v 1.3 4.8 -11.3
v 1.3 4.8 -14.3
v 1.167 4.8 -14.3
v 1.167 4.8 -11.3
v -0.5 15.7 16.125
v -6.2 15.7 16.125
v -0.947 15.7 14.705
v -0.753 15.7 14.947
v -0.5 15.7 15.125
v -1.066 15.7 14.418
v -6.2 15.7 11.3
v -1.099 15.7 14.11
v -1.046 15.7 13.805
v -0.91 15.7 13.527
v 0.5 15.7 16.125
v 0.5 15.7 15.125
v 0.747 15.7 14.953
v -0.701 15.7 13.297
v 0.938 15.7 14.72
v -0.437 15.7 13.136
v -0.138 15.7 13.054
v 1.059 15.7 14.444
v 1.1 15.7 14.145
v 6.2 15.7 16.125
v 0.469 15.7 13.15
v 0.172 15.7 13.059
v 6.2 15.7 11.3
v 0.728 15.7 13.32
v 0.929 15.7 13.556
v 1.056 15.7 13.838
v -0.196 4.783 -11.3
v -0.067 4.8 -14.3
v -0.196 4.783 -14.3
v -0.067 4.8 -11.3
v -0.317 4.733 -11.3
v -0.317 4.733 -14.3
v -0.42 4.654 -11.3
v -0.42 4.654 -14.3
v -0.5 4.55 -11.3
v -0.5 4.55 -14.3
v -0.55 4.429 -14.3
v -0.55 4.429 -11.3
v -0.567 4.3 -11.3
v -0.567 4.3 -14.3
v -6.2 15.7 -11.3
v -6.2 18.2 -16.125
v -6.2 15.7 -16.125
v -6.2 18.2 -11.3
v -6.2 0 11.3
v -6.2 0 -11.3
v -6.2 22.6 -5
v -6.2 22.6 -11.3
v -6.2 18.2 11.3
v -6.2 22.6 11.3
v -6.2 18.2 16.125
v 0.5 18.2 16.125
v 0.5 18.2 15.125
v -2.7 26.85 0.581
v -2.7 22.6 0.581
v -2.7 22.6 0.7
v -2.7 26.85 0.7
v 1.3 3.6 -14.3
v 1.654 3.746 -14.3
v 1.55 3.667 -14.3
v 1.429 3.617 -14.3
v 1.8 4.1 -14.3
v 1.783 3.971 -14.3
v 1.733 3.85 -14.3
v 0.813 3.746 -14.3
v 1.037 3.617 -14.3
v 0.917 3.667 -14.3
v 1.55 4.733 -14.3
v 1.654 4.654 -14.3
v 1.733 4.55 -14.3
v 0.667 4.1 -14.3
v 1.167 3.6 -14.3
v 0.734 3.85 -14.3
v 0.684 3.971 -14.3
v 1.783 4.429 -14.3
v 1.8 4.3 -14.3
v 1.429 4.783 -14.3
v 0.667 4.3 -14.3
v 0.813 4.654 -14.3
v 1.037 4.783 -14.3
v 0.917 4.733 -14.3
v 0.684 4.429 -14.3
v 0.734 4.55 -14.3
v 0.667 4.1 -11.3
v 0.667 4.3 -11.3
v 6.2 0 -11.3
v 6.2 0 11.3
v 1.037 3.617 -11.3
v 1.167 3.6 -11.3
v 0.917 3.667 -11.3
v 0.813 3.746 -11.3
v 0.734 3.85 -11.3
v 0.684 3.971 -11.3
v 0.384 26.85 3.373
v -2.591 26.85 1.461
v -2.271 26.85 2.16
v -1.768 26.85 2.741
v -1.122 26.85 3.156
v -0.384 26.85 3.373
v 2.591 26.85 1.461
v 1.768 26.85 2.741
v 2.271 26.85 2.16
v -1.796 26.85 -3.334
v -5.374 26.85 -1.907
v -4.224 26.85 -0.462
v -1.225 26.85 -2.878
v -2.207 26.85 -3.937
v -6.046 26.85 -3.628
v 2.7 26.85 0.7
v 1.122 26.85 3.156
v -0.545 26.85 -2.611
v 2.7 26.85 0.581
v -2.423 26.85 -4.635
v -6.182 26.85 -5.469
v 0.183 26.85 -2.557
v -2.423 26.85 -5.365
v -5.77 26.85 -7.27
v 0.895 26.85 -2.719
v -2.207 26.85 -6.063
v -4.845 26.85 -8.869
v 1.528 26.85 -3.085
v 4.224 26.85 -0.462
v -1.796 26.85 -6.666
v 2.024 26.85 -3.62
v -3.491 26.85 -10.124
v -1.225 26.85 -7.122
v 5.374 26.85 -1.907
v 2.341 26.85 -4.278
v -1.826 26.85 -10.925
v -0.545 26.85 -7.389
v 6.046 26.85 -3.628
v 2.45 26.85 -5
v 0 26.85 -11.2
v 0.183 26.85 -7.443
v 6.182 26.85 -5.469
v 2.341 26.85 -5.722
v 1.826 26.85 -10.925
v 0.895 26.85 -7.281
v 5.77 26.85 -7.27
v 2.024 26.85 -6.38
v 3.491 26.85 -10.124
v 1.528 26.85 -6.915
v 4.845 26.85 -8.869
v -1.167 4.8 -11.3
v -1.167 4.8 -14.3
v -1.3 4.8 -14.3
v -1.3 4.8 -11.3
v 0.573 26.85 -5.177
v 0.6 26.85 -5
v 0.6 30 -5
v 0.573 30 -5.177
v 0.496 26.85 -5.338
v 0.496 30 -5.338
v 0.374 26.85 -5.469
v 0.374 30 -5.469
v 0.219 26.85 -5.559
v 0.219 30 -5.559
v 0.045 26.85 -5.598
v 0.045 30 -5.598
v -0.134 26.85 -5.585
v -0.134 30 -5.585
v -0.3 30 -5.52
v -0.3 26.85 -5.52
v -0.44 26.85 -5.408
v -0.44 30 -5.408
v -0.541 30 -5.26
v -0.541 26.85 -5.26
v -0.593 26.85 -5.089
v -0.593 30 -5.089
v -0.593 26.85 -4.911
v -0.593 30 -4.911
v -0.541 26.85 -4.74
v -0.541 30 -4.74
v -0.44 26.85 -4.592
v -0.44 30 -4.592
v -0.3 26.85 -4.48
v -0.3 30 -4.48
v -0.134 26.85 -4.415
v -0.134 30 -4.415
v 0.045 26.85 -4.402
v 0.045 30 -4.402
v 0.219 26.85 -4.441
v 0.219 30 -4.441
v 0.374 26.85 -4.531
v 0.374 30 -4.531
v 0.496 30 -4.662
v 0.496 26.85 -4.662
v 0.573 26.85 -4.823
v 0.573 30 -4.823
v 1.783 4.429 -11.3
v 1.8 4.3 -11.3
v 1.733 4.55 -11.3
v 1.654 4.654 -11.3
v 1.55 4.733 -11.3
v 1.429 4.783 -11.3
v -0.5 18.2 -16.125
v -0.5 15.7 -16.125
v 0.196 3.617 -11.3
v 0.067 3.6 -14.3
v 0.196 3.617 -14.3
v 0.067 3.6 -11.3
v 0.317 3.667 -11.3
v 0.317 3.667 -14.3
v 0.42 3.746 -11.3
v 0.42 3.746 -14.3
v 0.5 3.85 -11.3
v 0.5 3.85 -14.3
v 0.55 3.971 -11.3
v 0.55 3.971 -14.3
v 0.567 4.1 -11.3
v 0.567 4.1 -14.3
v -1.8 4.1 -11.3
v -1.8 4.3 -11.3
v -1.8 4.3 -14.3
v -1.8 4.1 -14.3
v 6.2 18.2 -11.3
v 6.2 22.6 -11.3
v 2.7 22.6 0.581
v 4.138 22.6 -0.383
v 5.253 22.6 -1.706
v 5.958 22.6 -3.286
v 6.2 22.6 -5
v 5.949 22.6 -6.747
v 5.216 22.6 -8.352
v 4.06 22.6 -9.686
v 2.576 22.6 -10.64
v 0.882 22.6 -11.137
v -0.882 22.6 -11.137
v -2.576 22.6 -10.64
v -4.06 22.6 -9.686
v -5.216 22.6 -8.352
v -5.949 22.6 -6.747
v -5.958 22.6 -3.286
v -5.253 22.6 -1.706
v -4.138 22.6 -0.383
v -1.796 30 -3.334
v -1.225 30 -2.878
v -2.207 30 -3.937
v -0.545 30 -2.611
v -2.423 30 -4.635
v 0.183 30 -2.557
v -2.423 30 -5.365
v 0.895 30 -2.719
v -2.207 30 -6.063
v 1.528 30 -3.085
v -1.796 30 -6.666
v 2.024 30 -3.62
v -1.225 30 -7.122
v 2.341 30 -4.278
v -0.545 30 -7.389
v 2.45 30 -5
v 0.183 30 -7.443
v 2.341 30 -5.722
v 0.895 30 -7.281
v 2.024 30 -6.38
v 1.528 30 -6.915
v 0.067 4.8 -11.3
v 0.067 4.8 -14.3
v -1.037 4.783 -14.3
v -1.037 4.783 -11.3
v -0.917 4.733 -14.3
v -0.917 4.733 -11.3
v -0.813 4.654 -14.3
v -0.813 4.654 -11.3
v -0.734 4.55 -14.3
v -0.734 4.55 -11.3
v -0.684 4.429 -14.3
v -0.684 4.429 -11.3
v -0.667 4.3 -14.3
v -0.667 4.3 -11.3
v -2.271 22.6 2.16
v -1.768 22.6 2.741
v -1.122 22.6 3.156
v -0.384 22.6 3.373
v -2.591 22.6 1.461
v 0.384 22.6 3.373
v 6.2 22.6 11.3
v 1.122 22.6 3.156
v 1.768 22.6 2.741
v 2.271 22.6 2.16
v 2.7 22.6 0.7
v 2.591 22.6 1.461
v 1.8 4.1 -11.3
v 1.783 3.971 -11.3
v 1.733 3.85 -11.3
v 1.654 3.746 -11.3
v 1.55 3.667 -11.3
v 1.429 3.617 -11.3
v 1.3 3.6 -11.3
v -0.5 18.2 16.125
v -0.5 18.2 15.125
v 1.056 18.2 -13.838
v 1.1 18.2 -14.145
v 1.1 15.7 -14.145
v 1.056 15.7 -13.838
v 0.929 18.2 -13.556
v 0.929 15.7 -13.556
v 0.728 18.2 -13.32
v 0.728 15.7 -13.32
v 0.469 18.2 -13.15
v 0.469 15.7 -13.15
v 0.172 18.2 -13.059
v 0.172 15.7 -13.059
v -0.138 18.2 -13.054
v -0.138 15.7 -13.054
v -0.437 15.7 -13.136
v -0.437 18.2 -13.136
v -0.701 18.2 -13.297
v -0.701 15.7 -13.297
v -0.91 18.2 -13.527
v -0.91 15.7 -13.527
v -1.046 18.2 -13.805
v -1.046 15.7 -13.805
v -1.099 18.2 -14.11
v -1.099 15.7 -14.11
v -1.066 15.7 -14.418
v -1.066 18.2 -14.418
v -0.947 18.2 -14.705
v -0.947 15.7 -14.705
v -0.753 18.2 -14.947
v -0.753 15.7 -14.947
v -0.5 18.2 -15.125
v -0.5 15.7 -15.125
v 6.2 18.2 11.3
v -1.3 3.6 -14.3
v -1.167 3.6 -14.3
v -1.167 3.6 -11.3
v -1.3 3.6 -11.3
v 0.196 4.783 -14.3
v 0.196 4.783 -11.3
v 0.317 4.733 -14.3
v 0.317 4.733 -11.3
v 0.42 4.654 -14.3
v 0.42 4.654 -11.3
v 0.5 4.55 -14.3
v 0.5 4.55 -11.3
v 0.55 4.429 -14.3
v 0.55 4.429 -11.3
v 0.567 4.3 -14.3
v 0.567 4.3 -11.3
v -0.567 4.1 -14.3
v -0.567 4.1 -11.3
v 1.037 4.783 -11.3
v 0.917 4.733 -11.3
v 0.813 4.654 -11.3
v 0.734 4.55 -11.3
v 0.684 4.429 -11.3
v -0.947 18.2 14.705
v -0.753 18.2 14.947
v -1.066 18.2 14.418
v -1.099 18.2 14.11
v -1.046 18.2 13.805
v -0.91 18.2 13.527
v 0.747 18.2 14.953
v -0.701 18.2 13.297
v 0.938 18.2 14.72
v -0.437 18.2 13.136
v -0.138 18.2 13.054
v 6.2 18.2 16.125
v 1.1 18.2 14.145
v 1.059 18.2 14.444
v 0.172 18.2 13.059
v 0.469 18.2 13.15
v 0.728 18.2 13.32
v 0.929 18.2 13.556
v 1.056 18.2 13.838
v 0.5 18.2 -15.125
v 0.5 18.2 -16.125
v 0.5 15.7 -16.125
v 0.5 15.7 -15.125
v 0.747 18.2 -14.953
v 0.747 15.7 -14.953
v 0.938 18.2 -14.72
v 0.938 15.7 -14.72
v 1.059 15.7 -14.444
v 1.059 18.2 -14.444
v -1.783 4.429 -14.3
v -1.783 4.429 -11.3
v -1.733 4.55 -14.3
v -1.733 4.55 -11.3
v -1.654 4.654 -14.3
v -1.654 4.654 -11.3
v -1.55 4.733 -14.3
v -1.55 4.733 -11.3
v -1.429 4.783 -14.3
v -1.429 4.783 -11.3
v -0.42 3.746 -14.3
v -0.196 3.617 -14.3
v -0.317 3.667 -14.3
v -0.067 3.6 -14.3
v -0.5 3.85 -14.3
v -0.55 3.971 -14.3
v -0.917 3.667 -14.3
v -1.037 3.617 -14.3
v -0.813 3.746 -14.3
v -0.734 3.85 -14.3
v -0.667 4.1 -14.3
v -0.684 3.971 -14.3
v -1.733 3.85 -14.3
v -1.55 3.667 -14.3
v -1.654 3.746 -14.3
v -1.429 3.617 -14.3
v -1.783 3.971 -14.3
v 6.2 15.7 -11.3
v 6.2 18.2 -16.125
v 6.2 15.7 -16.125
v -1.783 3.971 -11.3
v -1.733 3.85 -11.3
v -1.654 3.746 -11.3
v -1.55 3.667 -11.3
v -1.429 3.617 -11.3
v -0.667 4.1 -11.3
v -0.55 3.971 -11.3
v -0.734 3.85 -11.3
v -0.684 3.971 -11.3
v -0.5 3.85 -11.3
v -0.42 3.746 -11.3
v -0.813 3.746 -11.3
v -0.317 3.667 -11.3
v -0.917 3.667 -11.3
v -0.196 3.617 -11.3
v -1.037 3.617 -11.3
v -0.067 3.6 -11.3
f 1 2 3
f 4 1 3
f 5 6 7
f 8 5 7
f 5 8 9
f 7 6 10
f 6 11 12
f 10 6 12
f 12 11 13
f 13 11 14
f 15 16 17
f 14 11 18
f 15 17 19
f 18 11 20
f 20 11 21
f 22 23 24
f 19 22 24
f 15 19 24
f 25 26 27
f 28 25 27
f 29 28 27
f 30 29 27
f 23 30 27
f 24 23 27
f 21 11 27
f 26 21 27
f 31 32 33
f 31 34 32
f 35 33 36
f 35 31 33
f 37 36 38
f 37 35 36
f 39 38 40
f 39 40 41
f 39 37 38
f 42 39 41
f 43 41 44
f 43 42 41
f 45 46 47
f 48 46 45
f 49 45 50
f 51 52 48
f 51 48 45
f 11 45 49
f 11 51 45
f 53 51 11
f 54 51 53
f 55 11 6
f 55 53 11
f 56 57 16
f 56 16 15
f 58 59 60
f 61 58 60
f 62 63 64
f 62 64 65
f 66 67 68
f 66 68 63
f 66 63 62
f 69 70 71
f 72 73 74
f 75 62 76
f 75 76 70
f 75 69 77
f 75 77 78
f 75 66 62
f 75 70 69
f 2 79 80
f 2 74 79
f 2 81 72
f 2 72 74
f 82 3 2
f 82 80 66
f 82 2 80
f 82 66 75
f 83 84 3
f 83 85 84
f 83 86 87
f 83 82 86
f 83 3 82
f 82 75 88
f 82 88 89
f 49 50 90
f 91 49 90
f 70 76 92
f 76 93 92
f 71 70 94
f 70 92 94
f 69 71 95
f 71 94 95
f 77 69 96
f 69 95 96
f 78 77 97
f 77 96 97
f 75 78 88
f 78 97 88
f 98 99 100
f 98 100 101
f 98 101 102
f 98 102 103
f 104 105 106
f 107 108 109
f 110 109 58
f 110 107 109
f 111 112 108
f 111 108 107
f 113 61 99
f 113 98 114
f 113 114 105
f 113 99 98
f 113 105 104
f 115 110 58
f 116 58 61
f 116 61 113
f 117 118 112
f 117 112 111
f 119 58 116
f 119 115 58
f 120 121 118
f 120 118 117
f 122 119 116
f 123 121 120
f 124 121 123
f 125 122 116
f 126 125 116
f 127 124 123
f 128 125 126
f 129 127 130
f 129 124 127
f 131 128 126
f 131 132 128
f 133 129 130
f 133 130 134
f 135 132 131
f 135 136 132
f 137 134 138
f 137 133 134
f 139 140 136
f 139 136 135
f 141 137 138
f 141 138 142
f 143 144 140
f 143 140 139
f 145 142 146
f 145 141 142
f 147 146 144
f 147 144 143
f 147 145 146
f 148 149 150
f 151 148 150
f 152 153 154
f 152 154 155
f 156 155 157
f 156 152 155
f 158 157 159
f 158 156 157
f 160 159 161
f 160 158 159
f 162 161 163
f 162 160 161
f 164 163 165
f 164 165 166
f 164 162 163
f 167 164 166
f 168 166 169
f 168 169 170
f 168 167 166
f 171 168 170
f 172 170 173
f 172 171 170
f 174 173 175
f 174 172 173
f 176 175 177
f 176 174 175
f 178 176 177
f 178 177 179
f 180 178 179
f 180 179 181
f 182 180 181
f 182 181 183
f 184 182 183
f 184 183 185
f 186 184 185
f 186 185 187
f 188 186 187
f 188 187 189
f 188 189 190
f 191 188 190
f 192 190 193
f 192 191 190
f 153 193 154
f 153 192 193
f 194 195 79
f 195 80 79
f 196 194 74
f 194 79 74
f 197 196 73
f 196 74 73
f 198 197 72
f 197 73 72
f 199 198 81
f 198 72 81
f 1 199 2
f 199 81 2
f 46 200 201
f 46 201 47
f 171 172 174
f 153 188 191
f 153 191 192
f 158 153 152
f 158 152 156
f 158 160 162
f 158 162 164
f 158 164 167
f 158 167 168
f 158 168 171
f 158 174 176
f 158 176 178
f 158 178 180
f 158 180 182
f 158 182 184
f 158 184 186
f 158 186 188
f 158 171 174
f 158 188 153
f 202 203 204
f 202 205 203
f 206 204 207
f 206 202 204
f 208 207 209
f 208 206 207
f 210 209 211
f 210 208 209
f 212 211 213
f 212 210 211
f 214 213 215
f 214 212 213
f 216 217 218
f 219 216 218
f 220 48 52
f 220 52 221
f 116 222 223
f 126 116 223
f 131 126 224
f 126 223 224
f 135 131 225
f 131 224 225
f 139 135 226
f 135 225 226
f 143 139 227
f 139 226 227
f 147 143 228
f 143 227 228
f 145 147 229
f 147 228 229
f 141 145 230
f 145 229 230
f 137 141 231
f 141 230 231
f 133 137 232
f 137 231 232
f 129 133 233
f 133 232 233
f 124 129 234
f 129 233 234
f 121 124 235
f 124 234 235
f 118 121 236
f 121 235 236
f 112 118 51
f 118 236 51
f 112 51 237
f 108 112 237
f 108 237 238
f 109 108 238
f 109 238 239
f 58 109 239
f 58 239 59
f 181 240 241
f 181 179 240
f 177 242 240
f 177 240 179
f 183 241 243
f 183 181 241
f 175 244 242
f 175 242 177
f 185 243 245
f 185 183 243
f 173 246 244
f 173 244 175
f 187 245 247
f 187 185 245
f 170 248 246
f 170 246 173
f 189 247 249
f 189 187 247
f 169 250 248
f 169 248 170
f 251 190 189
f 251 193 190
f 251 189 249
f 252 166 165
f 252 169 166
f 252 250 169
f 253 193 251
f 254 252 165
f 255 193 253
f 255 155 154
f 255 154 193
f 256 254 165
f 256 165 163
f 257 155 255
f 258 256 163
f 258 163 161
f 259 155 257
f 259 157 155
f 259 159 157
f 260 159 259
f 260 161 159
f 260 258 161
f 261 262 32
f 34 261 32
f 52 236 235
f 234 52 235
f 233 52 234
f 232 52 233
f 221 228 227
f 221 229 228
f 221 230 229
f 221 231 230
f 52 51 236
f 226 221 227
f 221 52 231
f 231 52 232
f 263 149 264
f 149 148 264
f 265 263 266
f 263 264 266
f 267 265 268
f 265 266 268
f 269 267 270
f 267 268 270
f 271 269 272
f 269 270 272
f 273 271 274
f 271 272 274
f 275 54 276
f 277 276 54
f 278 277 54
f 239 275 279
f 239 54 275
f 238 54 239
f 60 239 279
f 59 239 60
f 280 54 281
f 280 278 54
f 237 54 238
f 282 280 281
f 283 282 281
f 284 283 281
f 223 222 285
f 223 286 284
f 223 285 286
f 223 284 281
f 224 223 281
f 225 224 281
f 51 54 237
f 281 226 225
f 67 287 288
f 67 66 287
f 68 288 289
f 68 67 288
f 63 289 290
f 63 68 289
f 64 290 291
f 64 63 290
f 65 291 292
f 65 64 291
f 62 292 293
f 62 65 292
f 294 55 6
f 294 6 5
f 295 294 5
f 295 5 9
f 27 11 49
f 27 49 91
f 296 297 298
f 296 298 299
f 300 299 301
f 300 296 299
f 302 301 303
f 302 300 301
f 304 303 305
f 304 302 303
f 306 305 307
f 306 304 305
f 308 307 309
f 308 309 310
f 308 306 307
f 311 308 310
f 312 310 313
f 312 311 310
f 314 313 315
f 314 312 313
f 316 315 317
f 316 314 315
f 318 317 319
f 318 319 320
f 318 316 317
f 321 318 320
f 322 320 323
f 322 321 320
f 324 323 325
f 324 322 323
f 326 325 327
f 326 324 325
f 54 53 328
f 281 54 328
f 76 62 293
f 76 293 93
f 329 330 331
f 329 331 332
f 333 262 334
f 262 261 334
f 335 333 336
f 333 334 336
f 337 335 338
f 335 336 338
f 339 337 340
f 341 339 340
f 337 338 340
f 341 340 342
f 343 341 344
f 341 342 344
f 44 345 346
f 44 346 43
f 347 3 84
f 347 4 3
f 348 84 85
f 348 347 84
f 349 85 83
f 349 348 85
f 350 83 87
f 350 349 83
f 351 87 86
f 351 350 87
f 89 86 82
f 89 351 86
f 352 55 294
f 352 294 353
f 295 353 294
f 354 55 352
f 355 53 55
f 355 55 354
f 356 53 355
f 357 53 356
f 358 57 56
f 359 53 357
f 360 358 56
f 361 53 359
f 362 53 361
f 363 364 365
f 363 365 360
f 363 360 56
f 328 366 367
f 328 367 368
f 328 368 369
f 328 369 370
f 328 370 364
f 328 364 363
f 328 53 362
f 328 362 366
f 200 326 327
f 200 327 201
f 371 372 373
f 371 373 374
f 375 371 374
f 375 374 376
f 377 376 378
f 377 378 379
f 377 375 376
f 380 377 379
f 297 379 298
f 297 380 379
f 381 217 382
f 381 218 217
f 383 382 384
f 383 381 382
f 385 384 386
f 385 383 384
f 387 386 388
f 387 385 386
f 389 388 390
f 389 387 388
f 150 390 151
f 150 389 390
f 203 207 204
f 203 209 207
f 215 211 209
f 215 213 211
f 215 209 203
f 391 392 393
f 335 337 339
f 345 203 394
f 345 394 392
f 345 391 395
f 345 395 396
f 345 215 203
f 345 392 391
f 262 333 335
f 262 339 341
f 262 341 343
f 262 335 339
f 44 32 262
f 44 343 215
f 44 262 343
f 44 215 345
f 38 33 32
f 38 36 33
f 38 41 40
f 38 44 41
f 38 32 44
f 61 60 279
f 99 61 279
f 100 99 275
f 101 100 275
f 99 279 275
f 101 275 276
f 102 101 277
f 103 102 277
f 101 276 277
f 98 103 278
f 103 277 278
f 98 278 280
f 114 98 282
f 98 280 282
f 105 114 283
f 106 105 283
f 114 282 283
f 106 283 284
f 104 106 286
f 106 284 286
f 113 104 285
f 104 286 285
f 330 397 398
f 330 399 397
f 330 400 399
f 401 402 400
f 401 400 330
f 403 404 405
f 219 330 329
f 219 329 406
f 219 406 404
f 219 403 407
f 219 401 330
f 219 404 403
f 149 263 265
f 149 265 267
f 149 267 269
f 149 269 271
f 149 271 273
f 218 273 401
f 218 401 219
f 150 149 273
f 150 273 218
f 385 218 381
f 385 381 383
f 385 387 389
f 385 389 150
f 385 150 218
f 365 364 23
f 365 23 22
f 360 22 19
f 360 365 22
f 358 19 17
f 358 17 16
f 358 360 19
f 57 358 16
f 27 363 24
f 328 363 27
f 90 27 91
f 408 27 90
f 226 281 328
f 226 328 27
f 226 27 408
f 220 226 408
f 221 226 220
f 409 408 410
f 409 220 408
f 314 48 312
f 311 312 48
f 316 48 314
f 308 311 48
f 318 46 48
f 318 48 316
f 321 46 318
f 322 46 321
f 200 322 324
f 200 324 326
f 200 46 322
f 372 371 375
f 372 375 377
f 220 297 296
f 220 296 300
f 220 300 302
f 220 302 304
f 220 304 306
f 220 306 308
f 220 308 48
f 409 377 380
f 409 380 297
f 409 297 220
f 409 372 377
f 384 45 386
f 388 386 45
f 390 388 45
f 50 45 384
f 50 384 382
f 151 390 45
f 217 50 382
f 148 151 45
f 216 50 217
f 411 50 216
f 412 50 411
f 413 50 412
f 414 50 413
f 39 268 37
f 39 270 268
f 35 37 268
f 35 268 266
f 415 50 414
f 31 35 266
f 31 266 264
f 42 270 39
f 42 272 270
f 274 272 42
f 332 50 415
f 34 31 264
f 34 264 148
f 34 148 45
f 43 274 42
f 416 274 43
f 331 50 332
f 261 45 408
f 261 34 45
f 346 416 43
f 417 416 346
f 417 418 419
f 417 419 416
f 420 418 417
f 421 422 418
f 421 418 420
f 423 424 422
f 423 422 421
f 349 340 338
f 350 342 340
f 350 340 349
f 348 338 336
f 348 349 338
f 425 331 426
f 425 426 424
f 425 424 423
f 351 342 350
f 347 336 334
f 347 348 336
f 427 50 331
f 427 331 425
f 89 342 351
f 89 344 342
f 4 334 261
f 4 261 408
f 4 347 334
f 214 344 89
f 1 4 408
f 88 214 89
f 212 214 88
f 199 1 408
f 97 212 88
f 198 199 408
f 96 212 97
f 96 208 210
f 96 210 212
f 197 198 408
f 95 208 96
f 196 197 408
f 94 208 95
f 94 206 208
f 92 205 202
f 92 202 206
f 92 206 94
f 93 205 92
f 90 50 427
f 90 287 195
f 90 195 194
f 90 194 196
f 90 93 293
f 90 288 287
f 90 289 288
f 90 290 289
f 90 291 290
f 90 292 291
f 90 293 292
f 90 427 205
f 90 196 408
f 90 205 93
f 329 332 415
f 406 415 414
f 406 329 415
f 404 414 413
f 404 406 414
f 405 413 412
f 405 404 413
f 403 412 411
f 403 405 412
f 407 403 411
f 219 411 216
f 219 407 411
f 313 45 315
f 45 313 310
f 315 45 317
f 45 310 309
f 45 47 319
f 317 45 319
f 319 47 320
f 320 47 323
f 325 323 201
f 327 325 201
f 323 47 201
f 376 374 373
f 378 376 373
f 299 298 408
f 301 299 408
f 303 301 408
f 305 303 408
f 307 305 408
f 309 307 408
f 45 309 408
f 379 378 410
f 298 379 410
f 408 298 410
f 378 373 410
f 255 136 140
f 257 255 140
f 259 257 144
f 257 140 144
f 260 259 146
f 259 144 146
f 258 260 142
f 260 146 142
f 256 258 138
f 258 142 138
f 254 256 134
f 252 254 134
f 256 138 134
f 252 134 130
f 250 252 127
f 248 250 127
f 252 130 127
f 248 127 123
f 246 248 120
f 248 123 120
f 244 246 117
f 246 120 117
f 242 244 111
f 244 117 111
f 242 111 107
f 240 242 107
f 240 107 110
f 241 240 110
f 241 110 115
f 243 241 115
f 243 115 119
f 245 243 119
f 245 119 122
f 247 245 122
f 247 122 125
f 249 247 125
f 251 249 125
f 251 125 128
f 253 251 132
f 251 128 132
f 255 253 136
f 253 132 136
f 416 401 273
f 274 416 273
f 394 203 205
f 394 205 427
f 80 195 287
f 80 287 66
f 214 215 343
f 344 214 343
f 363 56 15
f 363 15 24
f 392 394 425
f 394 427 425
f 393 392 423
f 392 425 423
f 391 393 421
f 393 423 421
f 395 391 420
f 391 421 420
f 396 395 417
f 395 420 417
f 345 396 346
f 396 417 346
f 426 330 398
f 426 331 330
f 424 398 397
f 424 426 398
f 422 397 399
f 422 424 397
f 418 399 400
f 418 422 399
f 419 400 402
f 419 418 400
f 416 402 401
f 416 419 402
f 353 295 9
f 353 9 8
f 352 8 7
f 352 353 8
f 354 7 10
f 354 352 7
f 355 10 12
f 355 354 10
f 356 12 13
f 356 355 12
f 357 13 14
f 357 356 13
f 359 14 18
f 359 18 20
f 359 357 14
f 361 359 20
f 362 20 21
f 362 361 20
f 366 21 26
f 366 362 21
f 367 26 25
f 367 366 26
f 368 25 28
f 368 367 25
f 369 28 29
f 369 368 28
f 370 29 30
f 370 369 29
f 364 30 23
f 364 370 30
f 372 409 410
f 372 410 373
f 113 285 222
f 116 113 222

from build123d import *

# Parameters (mm, degrees)
IZIM1_W                     = 12.4
IZIM1_H                     = 22.6
Y_KSEKLIK_EKSTR_ZYON1_DEPTH = 22.6
Y_KSEKLIK_EKSTR_ZYON2_DEPTH = 2.5
IZIM3_W                     = 3.6
IZIM3_H                     = 3
Y_KSEKLIK_EKSTR_ZYON3_DEPTH = 1.2
IZIM4_R                     = 6.2
Y_KSEKLIK_EKSTR_ZYON4_DEPTH = 4.25
IZIM5_R                     = 2.45
IZIM5_R_2                   = 0.6
Y_KSEKLIK_EKSTR_ZYON6_DEPTH = 3.15
IZIM6_W                     = 0.1
IZIM6_H                     = 1.2
KES_EKSTR_ZYON1_DEPTH       = 3
RADYUS1_R                   = 0.5


with BuildPart() as part:
    # Çizim1 → Yükseklik-Ekstrüzyon1 (new body)
    with BuildSketch(Plane(origin=(0, 0, 0), x_dir=(1, 0, 0), z_dir=(0, 1, 0))):
        Rectangle(IZIM1_W, IZIM1_H)
    extrude(amount=Y_KSEKLIK_EKSTR_ZYON1_DEPTH)

    # Çizim2 → Yükseklik-Ekstrüzyon2 (add)
    with BuildSketch(Plane(origin=(0, 18.2, 0), x_dir=(1, 0, 0), z_dir=(0, 1, 0))):
        with BuildLine():
            Line((-6.2, 16.125), (-6.2, -16.125))
            Line((-6.2, -16.125), (-0.5, -16.125))
            Line((-0.5, -16.125), (-0.5, -15.125))
            ThreePointArc((-0.5, -15.125), (-0.574456265, -13.207120951), (1.1, -14.145204103))
            ThreePointArc((1.1, -14.145204103), (0.938083152, -14.719660368), (0.5, -15.125))
            Line((0.5, -15.125), (0.5, -16.125))
            Line((0.5, -16.125), (6.2, -16.125))
            Line((6.2, -16.125), (6.2, 16.125))
            Line((6.2, 16.125), (0.5, 16.125))
            Line((0.5, 16.125), (0.5, 15.125))
            ThreePointArc((0.5, 15.125), (0.938083152, 14.719660368), (1.1, 14.145204103))
            ThreePointArc((1.1, 14.145204103), (-0.574456265, 13.207120951), (-0.5, 15.125))
            Line((-0.5, 15.125), (-0.5, 16.125))
            Line((-0.5, 16.125), (-6.2, 16.125))
        make_face()
    extrude(amount=-Y_KSEKLIK_EKSTR_ZYON2_DEPTH)

    # Çizim3 → Yükseklik-Ekstrüzyon3 (add)
    with BuildSketch(Plane(origin=(0, 4.8, 0), x_dir=(-1, 0, 0), z_dir=(0, -1, 0))):
        with Locations((0, 12.8)):
            Rectangle(IZIM3_W, IZIM3_H)
    extrude(amount=Y_KSEKLIK_EKSTR_ZYON3_DEPTH)

    # Çizim4 → Yükseklik-Ekstrüzyon4 (add)
    with BuildSketch(Plane(origin=(0, 22.6, 0), x_dir=(1, 0, 0), z_dir=(0, 1, 0))):
        with Locations((0, 5)):
            Circle(IZIM4_R)
        with BuildLine():
            Line((-2.7, -0.581218505), (-2.7, -0.7))
            ThreePointArc((-2.7, -0.7), (0, -3.4), (2.7, -0.7))
            Line((2.7, -0.7), (2.7, -0.581218505))
            ThreePointArc((2.7, -0.581218505), (0, -1.2), (-2.7, -0.581218505))
        make_face()
    extrude(amount=Y_KSEKLIK_EKSTR_ZYON4_DEPTH)

    # Çizim5 → Yükseklik-Ekstrüzyon6 (add)
    with BuildSketch(Plane(origin=(0, 26.85, 0), x_dir=(1, 0, 0), z_dir=(0, 1, 0))):
        with Locations((0, 5)):
            Circle(IZIM5_R)
        with Locations((0, 5)):
            Circle(IZIM5_R_2, mode=Mode.SUBTRACT)
    extrude(amount=Y_KSEKLIK_EKSTR_ZYON6_DEPTH)

    # Çizim6 → Kes-Ekstrüzyon1 (cut)
    with BuildSketch(Plane(origin=(0, 0, -14.3), x_dir=(-1, 0, 0), z_dir=(0, 0, -1))):
        with Locations((-0.616666667, 4.2)):
            Rectangle(IZIM6_W, IZIM6_H)
        with Locations((0.616666667, 4.2)):
            Rectangle(IZIM6_W, IZIM6_H)
    extrude(amount=-KES_EKSTR_ZYON1_DEPTH, mode=Mode.SUBTRACT)

    # Radyus1
    radyus1_edges = [part.edges().sort_by_distance(p)[0] for p in [
        (0.566666667, 3.6, -12.8),
        (0.566666667, 4.8, -12.8),
        (0.666666667, 4.8, -12.8),
        (0.666666667, 3.6, -12.8),
        (-0.666666667, 3.6, -12.8),
        (-0.666666667, 4.8, -12.8),
        (-0.566666667, 4.8, -12.8),
        (-0.566666667, 3.6, -12.8),
        (1.8, 4.8, -12.8),
        (-1.8, 4.8, -12.8),
        (1.8, 3.6, -12.8),
        (-1.8, 3.6, -12.8),
    ]]
    fillet(radyus1_edges, radius=RADYUS1_R)


solid = part.part
